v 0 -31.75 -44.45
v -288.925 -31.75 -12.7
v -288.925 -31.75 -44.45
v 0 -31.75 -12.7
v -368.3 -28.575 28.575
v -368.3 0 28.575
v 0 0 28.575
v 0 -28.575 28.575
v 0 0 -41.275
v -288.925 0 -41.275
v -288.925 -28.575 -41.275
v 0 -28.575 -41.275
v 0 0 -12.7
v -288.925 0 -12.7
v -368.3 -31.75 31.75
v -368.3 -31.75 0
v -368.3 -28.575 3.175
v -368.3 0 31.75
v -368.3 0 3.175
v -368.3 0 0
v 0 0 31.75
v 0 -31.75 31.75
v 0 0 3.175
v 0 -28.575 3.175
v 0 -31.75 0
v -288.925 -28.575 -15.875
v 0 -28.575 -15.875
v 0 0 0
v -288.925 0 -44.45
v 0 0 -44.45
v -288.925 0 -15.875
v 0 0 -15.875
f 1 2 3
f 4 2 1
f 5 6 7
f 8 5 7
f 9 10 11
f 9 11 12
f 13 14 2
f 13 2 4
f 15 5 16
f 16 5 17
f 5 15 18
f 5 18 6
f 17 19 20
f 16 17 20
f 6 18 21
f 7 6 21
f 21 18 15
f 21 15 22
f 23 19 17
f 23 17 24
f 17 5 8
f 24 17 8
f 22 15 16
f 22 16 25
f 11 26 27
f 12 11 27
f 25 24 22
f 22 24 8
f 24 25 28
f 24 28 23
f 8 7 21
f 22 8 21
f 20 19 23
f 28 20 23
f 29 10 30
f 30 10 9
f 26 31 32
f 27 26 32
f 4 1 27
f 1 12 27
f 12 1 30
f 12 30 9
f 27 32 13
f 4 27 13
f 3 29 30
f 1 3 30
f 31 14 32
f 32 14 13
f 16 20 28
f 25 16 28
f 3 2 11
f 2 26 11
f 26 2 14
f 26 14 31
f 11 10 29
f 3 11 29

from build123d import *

# Parameters (mm, degrees)
F0_W     = 368.3
F0_H     = 3.175
F0_H_2   = 25.4
F1_DEPTH = 31.75
F2_DEPTH = 28.575
F3_W     = 288.925
F3_H     = 25.4
F3_H_2   = 3.175
F4_DEPTH = 31.75
F5_DEPTH = 28.575


with BuildPart() as f1:
    # F0 (on Front) → F1 (new body)
    with BuildSketch(Plane.XZ):
        with Locations((-184.15, 30.1625)):
            Rectangle(F0_W, F0_H)
        with Locations((-184.15, 15.875)):
            Rectangle(F0_W, F0_H_2)
        with Locations((-184.15, 1.5875)):
            Rectangle(F0_W, F0_H)
    extrude(amount=F1_DEPTH)

    # F0 (on Front) → F2 (cut)
    with BuildSketch(Plane.XZ):
        with Locations((-184.15, 15.875)):
            Rectangle(F0_W, F0_H_2)
    extrude(amount=F2_DEPTH, mode=Mode.SUBTRACT)


with BuildPart() as f4:
    # F3 (on Front) → F4 (new body)
    with BuildSketch(Plane.XZ):
        with Locations((-144.4625, -28.575)):
            Rectangle(F3_W, F3_H)
        with Locations((-144.4625, -14.2875)):
            Rectangle(F3_W, F3_H_2)
        with Locations((-144.4625, -42.8625)):
            Rectangle(F3_W, F3_H_2)
    extrude(amount=F4_DEPTH)

    # F3 (on Front) → F5 (cut)
    with BuildSketch(Plane.XZ):
        with Locations((-144.4625, -28.575)):
            Rectangle(F3_W, F3_H)
    extrude(amount=F5_DEPTH, mode=Mode.SUBTRACT)


solid = Compound([f1.part, f4.part])
